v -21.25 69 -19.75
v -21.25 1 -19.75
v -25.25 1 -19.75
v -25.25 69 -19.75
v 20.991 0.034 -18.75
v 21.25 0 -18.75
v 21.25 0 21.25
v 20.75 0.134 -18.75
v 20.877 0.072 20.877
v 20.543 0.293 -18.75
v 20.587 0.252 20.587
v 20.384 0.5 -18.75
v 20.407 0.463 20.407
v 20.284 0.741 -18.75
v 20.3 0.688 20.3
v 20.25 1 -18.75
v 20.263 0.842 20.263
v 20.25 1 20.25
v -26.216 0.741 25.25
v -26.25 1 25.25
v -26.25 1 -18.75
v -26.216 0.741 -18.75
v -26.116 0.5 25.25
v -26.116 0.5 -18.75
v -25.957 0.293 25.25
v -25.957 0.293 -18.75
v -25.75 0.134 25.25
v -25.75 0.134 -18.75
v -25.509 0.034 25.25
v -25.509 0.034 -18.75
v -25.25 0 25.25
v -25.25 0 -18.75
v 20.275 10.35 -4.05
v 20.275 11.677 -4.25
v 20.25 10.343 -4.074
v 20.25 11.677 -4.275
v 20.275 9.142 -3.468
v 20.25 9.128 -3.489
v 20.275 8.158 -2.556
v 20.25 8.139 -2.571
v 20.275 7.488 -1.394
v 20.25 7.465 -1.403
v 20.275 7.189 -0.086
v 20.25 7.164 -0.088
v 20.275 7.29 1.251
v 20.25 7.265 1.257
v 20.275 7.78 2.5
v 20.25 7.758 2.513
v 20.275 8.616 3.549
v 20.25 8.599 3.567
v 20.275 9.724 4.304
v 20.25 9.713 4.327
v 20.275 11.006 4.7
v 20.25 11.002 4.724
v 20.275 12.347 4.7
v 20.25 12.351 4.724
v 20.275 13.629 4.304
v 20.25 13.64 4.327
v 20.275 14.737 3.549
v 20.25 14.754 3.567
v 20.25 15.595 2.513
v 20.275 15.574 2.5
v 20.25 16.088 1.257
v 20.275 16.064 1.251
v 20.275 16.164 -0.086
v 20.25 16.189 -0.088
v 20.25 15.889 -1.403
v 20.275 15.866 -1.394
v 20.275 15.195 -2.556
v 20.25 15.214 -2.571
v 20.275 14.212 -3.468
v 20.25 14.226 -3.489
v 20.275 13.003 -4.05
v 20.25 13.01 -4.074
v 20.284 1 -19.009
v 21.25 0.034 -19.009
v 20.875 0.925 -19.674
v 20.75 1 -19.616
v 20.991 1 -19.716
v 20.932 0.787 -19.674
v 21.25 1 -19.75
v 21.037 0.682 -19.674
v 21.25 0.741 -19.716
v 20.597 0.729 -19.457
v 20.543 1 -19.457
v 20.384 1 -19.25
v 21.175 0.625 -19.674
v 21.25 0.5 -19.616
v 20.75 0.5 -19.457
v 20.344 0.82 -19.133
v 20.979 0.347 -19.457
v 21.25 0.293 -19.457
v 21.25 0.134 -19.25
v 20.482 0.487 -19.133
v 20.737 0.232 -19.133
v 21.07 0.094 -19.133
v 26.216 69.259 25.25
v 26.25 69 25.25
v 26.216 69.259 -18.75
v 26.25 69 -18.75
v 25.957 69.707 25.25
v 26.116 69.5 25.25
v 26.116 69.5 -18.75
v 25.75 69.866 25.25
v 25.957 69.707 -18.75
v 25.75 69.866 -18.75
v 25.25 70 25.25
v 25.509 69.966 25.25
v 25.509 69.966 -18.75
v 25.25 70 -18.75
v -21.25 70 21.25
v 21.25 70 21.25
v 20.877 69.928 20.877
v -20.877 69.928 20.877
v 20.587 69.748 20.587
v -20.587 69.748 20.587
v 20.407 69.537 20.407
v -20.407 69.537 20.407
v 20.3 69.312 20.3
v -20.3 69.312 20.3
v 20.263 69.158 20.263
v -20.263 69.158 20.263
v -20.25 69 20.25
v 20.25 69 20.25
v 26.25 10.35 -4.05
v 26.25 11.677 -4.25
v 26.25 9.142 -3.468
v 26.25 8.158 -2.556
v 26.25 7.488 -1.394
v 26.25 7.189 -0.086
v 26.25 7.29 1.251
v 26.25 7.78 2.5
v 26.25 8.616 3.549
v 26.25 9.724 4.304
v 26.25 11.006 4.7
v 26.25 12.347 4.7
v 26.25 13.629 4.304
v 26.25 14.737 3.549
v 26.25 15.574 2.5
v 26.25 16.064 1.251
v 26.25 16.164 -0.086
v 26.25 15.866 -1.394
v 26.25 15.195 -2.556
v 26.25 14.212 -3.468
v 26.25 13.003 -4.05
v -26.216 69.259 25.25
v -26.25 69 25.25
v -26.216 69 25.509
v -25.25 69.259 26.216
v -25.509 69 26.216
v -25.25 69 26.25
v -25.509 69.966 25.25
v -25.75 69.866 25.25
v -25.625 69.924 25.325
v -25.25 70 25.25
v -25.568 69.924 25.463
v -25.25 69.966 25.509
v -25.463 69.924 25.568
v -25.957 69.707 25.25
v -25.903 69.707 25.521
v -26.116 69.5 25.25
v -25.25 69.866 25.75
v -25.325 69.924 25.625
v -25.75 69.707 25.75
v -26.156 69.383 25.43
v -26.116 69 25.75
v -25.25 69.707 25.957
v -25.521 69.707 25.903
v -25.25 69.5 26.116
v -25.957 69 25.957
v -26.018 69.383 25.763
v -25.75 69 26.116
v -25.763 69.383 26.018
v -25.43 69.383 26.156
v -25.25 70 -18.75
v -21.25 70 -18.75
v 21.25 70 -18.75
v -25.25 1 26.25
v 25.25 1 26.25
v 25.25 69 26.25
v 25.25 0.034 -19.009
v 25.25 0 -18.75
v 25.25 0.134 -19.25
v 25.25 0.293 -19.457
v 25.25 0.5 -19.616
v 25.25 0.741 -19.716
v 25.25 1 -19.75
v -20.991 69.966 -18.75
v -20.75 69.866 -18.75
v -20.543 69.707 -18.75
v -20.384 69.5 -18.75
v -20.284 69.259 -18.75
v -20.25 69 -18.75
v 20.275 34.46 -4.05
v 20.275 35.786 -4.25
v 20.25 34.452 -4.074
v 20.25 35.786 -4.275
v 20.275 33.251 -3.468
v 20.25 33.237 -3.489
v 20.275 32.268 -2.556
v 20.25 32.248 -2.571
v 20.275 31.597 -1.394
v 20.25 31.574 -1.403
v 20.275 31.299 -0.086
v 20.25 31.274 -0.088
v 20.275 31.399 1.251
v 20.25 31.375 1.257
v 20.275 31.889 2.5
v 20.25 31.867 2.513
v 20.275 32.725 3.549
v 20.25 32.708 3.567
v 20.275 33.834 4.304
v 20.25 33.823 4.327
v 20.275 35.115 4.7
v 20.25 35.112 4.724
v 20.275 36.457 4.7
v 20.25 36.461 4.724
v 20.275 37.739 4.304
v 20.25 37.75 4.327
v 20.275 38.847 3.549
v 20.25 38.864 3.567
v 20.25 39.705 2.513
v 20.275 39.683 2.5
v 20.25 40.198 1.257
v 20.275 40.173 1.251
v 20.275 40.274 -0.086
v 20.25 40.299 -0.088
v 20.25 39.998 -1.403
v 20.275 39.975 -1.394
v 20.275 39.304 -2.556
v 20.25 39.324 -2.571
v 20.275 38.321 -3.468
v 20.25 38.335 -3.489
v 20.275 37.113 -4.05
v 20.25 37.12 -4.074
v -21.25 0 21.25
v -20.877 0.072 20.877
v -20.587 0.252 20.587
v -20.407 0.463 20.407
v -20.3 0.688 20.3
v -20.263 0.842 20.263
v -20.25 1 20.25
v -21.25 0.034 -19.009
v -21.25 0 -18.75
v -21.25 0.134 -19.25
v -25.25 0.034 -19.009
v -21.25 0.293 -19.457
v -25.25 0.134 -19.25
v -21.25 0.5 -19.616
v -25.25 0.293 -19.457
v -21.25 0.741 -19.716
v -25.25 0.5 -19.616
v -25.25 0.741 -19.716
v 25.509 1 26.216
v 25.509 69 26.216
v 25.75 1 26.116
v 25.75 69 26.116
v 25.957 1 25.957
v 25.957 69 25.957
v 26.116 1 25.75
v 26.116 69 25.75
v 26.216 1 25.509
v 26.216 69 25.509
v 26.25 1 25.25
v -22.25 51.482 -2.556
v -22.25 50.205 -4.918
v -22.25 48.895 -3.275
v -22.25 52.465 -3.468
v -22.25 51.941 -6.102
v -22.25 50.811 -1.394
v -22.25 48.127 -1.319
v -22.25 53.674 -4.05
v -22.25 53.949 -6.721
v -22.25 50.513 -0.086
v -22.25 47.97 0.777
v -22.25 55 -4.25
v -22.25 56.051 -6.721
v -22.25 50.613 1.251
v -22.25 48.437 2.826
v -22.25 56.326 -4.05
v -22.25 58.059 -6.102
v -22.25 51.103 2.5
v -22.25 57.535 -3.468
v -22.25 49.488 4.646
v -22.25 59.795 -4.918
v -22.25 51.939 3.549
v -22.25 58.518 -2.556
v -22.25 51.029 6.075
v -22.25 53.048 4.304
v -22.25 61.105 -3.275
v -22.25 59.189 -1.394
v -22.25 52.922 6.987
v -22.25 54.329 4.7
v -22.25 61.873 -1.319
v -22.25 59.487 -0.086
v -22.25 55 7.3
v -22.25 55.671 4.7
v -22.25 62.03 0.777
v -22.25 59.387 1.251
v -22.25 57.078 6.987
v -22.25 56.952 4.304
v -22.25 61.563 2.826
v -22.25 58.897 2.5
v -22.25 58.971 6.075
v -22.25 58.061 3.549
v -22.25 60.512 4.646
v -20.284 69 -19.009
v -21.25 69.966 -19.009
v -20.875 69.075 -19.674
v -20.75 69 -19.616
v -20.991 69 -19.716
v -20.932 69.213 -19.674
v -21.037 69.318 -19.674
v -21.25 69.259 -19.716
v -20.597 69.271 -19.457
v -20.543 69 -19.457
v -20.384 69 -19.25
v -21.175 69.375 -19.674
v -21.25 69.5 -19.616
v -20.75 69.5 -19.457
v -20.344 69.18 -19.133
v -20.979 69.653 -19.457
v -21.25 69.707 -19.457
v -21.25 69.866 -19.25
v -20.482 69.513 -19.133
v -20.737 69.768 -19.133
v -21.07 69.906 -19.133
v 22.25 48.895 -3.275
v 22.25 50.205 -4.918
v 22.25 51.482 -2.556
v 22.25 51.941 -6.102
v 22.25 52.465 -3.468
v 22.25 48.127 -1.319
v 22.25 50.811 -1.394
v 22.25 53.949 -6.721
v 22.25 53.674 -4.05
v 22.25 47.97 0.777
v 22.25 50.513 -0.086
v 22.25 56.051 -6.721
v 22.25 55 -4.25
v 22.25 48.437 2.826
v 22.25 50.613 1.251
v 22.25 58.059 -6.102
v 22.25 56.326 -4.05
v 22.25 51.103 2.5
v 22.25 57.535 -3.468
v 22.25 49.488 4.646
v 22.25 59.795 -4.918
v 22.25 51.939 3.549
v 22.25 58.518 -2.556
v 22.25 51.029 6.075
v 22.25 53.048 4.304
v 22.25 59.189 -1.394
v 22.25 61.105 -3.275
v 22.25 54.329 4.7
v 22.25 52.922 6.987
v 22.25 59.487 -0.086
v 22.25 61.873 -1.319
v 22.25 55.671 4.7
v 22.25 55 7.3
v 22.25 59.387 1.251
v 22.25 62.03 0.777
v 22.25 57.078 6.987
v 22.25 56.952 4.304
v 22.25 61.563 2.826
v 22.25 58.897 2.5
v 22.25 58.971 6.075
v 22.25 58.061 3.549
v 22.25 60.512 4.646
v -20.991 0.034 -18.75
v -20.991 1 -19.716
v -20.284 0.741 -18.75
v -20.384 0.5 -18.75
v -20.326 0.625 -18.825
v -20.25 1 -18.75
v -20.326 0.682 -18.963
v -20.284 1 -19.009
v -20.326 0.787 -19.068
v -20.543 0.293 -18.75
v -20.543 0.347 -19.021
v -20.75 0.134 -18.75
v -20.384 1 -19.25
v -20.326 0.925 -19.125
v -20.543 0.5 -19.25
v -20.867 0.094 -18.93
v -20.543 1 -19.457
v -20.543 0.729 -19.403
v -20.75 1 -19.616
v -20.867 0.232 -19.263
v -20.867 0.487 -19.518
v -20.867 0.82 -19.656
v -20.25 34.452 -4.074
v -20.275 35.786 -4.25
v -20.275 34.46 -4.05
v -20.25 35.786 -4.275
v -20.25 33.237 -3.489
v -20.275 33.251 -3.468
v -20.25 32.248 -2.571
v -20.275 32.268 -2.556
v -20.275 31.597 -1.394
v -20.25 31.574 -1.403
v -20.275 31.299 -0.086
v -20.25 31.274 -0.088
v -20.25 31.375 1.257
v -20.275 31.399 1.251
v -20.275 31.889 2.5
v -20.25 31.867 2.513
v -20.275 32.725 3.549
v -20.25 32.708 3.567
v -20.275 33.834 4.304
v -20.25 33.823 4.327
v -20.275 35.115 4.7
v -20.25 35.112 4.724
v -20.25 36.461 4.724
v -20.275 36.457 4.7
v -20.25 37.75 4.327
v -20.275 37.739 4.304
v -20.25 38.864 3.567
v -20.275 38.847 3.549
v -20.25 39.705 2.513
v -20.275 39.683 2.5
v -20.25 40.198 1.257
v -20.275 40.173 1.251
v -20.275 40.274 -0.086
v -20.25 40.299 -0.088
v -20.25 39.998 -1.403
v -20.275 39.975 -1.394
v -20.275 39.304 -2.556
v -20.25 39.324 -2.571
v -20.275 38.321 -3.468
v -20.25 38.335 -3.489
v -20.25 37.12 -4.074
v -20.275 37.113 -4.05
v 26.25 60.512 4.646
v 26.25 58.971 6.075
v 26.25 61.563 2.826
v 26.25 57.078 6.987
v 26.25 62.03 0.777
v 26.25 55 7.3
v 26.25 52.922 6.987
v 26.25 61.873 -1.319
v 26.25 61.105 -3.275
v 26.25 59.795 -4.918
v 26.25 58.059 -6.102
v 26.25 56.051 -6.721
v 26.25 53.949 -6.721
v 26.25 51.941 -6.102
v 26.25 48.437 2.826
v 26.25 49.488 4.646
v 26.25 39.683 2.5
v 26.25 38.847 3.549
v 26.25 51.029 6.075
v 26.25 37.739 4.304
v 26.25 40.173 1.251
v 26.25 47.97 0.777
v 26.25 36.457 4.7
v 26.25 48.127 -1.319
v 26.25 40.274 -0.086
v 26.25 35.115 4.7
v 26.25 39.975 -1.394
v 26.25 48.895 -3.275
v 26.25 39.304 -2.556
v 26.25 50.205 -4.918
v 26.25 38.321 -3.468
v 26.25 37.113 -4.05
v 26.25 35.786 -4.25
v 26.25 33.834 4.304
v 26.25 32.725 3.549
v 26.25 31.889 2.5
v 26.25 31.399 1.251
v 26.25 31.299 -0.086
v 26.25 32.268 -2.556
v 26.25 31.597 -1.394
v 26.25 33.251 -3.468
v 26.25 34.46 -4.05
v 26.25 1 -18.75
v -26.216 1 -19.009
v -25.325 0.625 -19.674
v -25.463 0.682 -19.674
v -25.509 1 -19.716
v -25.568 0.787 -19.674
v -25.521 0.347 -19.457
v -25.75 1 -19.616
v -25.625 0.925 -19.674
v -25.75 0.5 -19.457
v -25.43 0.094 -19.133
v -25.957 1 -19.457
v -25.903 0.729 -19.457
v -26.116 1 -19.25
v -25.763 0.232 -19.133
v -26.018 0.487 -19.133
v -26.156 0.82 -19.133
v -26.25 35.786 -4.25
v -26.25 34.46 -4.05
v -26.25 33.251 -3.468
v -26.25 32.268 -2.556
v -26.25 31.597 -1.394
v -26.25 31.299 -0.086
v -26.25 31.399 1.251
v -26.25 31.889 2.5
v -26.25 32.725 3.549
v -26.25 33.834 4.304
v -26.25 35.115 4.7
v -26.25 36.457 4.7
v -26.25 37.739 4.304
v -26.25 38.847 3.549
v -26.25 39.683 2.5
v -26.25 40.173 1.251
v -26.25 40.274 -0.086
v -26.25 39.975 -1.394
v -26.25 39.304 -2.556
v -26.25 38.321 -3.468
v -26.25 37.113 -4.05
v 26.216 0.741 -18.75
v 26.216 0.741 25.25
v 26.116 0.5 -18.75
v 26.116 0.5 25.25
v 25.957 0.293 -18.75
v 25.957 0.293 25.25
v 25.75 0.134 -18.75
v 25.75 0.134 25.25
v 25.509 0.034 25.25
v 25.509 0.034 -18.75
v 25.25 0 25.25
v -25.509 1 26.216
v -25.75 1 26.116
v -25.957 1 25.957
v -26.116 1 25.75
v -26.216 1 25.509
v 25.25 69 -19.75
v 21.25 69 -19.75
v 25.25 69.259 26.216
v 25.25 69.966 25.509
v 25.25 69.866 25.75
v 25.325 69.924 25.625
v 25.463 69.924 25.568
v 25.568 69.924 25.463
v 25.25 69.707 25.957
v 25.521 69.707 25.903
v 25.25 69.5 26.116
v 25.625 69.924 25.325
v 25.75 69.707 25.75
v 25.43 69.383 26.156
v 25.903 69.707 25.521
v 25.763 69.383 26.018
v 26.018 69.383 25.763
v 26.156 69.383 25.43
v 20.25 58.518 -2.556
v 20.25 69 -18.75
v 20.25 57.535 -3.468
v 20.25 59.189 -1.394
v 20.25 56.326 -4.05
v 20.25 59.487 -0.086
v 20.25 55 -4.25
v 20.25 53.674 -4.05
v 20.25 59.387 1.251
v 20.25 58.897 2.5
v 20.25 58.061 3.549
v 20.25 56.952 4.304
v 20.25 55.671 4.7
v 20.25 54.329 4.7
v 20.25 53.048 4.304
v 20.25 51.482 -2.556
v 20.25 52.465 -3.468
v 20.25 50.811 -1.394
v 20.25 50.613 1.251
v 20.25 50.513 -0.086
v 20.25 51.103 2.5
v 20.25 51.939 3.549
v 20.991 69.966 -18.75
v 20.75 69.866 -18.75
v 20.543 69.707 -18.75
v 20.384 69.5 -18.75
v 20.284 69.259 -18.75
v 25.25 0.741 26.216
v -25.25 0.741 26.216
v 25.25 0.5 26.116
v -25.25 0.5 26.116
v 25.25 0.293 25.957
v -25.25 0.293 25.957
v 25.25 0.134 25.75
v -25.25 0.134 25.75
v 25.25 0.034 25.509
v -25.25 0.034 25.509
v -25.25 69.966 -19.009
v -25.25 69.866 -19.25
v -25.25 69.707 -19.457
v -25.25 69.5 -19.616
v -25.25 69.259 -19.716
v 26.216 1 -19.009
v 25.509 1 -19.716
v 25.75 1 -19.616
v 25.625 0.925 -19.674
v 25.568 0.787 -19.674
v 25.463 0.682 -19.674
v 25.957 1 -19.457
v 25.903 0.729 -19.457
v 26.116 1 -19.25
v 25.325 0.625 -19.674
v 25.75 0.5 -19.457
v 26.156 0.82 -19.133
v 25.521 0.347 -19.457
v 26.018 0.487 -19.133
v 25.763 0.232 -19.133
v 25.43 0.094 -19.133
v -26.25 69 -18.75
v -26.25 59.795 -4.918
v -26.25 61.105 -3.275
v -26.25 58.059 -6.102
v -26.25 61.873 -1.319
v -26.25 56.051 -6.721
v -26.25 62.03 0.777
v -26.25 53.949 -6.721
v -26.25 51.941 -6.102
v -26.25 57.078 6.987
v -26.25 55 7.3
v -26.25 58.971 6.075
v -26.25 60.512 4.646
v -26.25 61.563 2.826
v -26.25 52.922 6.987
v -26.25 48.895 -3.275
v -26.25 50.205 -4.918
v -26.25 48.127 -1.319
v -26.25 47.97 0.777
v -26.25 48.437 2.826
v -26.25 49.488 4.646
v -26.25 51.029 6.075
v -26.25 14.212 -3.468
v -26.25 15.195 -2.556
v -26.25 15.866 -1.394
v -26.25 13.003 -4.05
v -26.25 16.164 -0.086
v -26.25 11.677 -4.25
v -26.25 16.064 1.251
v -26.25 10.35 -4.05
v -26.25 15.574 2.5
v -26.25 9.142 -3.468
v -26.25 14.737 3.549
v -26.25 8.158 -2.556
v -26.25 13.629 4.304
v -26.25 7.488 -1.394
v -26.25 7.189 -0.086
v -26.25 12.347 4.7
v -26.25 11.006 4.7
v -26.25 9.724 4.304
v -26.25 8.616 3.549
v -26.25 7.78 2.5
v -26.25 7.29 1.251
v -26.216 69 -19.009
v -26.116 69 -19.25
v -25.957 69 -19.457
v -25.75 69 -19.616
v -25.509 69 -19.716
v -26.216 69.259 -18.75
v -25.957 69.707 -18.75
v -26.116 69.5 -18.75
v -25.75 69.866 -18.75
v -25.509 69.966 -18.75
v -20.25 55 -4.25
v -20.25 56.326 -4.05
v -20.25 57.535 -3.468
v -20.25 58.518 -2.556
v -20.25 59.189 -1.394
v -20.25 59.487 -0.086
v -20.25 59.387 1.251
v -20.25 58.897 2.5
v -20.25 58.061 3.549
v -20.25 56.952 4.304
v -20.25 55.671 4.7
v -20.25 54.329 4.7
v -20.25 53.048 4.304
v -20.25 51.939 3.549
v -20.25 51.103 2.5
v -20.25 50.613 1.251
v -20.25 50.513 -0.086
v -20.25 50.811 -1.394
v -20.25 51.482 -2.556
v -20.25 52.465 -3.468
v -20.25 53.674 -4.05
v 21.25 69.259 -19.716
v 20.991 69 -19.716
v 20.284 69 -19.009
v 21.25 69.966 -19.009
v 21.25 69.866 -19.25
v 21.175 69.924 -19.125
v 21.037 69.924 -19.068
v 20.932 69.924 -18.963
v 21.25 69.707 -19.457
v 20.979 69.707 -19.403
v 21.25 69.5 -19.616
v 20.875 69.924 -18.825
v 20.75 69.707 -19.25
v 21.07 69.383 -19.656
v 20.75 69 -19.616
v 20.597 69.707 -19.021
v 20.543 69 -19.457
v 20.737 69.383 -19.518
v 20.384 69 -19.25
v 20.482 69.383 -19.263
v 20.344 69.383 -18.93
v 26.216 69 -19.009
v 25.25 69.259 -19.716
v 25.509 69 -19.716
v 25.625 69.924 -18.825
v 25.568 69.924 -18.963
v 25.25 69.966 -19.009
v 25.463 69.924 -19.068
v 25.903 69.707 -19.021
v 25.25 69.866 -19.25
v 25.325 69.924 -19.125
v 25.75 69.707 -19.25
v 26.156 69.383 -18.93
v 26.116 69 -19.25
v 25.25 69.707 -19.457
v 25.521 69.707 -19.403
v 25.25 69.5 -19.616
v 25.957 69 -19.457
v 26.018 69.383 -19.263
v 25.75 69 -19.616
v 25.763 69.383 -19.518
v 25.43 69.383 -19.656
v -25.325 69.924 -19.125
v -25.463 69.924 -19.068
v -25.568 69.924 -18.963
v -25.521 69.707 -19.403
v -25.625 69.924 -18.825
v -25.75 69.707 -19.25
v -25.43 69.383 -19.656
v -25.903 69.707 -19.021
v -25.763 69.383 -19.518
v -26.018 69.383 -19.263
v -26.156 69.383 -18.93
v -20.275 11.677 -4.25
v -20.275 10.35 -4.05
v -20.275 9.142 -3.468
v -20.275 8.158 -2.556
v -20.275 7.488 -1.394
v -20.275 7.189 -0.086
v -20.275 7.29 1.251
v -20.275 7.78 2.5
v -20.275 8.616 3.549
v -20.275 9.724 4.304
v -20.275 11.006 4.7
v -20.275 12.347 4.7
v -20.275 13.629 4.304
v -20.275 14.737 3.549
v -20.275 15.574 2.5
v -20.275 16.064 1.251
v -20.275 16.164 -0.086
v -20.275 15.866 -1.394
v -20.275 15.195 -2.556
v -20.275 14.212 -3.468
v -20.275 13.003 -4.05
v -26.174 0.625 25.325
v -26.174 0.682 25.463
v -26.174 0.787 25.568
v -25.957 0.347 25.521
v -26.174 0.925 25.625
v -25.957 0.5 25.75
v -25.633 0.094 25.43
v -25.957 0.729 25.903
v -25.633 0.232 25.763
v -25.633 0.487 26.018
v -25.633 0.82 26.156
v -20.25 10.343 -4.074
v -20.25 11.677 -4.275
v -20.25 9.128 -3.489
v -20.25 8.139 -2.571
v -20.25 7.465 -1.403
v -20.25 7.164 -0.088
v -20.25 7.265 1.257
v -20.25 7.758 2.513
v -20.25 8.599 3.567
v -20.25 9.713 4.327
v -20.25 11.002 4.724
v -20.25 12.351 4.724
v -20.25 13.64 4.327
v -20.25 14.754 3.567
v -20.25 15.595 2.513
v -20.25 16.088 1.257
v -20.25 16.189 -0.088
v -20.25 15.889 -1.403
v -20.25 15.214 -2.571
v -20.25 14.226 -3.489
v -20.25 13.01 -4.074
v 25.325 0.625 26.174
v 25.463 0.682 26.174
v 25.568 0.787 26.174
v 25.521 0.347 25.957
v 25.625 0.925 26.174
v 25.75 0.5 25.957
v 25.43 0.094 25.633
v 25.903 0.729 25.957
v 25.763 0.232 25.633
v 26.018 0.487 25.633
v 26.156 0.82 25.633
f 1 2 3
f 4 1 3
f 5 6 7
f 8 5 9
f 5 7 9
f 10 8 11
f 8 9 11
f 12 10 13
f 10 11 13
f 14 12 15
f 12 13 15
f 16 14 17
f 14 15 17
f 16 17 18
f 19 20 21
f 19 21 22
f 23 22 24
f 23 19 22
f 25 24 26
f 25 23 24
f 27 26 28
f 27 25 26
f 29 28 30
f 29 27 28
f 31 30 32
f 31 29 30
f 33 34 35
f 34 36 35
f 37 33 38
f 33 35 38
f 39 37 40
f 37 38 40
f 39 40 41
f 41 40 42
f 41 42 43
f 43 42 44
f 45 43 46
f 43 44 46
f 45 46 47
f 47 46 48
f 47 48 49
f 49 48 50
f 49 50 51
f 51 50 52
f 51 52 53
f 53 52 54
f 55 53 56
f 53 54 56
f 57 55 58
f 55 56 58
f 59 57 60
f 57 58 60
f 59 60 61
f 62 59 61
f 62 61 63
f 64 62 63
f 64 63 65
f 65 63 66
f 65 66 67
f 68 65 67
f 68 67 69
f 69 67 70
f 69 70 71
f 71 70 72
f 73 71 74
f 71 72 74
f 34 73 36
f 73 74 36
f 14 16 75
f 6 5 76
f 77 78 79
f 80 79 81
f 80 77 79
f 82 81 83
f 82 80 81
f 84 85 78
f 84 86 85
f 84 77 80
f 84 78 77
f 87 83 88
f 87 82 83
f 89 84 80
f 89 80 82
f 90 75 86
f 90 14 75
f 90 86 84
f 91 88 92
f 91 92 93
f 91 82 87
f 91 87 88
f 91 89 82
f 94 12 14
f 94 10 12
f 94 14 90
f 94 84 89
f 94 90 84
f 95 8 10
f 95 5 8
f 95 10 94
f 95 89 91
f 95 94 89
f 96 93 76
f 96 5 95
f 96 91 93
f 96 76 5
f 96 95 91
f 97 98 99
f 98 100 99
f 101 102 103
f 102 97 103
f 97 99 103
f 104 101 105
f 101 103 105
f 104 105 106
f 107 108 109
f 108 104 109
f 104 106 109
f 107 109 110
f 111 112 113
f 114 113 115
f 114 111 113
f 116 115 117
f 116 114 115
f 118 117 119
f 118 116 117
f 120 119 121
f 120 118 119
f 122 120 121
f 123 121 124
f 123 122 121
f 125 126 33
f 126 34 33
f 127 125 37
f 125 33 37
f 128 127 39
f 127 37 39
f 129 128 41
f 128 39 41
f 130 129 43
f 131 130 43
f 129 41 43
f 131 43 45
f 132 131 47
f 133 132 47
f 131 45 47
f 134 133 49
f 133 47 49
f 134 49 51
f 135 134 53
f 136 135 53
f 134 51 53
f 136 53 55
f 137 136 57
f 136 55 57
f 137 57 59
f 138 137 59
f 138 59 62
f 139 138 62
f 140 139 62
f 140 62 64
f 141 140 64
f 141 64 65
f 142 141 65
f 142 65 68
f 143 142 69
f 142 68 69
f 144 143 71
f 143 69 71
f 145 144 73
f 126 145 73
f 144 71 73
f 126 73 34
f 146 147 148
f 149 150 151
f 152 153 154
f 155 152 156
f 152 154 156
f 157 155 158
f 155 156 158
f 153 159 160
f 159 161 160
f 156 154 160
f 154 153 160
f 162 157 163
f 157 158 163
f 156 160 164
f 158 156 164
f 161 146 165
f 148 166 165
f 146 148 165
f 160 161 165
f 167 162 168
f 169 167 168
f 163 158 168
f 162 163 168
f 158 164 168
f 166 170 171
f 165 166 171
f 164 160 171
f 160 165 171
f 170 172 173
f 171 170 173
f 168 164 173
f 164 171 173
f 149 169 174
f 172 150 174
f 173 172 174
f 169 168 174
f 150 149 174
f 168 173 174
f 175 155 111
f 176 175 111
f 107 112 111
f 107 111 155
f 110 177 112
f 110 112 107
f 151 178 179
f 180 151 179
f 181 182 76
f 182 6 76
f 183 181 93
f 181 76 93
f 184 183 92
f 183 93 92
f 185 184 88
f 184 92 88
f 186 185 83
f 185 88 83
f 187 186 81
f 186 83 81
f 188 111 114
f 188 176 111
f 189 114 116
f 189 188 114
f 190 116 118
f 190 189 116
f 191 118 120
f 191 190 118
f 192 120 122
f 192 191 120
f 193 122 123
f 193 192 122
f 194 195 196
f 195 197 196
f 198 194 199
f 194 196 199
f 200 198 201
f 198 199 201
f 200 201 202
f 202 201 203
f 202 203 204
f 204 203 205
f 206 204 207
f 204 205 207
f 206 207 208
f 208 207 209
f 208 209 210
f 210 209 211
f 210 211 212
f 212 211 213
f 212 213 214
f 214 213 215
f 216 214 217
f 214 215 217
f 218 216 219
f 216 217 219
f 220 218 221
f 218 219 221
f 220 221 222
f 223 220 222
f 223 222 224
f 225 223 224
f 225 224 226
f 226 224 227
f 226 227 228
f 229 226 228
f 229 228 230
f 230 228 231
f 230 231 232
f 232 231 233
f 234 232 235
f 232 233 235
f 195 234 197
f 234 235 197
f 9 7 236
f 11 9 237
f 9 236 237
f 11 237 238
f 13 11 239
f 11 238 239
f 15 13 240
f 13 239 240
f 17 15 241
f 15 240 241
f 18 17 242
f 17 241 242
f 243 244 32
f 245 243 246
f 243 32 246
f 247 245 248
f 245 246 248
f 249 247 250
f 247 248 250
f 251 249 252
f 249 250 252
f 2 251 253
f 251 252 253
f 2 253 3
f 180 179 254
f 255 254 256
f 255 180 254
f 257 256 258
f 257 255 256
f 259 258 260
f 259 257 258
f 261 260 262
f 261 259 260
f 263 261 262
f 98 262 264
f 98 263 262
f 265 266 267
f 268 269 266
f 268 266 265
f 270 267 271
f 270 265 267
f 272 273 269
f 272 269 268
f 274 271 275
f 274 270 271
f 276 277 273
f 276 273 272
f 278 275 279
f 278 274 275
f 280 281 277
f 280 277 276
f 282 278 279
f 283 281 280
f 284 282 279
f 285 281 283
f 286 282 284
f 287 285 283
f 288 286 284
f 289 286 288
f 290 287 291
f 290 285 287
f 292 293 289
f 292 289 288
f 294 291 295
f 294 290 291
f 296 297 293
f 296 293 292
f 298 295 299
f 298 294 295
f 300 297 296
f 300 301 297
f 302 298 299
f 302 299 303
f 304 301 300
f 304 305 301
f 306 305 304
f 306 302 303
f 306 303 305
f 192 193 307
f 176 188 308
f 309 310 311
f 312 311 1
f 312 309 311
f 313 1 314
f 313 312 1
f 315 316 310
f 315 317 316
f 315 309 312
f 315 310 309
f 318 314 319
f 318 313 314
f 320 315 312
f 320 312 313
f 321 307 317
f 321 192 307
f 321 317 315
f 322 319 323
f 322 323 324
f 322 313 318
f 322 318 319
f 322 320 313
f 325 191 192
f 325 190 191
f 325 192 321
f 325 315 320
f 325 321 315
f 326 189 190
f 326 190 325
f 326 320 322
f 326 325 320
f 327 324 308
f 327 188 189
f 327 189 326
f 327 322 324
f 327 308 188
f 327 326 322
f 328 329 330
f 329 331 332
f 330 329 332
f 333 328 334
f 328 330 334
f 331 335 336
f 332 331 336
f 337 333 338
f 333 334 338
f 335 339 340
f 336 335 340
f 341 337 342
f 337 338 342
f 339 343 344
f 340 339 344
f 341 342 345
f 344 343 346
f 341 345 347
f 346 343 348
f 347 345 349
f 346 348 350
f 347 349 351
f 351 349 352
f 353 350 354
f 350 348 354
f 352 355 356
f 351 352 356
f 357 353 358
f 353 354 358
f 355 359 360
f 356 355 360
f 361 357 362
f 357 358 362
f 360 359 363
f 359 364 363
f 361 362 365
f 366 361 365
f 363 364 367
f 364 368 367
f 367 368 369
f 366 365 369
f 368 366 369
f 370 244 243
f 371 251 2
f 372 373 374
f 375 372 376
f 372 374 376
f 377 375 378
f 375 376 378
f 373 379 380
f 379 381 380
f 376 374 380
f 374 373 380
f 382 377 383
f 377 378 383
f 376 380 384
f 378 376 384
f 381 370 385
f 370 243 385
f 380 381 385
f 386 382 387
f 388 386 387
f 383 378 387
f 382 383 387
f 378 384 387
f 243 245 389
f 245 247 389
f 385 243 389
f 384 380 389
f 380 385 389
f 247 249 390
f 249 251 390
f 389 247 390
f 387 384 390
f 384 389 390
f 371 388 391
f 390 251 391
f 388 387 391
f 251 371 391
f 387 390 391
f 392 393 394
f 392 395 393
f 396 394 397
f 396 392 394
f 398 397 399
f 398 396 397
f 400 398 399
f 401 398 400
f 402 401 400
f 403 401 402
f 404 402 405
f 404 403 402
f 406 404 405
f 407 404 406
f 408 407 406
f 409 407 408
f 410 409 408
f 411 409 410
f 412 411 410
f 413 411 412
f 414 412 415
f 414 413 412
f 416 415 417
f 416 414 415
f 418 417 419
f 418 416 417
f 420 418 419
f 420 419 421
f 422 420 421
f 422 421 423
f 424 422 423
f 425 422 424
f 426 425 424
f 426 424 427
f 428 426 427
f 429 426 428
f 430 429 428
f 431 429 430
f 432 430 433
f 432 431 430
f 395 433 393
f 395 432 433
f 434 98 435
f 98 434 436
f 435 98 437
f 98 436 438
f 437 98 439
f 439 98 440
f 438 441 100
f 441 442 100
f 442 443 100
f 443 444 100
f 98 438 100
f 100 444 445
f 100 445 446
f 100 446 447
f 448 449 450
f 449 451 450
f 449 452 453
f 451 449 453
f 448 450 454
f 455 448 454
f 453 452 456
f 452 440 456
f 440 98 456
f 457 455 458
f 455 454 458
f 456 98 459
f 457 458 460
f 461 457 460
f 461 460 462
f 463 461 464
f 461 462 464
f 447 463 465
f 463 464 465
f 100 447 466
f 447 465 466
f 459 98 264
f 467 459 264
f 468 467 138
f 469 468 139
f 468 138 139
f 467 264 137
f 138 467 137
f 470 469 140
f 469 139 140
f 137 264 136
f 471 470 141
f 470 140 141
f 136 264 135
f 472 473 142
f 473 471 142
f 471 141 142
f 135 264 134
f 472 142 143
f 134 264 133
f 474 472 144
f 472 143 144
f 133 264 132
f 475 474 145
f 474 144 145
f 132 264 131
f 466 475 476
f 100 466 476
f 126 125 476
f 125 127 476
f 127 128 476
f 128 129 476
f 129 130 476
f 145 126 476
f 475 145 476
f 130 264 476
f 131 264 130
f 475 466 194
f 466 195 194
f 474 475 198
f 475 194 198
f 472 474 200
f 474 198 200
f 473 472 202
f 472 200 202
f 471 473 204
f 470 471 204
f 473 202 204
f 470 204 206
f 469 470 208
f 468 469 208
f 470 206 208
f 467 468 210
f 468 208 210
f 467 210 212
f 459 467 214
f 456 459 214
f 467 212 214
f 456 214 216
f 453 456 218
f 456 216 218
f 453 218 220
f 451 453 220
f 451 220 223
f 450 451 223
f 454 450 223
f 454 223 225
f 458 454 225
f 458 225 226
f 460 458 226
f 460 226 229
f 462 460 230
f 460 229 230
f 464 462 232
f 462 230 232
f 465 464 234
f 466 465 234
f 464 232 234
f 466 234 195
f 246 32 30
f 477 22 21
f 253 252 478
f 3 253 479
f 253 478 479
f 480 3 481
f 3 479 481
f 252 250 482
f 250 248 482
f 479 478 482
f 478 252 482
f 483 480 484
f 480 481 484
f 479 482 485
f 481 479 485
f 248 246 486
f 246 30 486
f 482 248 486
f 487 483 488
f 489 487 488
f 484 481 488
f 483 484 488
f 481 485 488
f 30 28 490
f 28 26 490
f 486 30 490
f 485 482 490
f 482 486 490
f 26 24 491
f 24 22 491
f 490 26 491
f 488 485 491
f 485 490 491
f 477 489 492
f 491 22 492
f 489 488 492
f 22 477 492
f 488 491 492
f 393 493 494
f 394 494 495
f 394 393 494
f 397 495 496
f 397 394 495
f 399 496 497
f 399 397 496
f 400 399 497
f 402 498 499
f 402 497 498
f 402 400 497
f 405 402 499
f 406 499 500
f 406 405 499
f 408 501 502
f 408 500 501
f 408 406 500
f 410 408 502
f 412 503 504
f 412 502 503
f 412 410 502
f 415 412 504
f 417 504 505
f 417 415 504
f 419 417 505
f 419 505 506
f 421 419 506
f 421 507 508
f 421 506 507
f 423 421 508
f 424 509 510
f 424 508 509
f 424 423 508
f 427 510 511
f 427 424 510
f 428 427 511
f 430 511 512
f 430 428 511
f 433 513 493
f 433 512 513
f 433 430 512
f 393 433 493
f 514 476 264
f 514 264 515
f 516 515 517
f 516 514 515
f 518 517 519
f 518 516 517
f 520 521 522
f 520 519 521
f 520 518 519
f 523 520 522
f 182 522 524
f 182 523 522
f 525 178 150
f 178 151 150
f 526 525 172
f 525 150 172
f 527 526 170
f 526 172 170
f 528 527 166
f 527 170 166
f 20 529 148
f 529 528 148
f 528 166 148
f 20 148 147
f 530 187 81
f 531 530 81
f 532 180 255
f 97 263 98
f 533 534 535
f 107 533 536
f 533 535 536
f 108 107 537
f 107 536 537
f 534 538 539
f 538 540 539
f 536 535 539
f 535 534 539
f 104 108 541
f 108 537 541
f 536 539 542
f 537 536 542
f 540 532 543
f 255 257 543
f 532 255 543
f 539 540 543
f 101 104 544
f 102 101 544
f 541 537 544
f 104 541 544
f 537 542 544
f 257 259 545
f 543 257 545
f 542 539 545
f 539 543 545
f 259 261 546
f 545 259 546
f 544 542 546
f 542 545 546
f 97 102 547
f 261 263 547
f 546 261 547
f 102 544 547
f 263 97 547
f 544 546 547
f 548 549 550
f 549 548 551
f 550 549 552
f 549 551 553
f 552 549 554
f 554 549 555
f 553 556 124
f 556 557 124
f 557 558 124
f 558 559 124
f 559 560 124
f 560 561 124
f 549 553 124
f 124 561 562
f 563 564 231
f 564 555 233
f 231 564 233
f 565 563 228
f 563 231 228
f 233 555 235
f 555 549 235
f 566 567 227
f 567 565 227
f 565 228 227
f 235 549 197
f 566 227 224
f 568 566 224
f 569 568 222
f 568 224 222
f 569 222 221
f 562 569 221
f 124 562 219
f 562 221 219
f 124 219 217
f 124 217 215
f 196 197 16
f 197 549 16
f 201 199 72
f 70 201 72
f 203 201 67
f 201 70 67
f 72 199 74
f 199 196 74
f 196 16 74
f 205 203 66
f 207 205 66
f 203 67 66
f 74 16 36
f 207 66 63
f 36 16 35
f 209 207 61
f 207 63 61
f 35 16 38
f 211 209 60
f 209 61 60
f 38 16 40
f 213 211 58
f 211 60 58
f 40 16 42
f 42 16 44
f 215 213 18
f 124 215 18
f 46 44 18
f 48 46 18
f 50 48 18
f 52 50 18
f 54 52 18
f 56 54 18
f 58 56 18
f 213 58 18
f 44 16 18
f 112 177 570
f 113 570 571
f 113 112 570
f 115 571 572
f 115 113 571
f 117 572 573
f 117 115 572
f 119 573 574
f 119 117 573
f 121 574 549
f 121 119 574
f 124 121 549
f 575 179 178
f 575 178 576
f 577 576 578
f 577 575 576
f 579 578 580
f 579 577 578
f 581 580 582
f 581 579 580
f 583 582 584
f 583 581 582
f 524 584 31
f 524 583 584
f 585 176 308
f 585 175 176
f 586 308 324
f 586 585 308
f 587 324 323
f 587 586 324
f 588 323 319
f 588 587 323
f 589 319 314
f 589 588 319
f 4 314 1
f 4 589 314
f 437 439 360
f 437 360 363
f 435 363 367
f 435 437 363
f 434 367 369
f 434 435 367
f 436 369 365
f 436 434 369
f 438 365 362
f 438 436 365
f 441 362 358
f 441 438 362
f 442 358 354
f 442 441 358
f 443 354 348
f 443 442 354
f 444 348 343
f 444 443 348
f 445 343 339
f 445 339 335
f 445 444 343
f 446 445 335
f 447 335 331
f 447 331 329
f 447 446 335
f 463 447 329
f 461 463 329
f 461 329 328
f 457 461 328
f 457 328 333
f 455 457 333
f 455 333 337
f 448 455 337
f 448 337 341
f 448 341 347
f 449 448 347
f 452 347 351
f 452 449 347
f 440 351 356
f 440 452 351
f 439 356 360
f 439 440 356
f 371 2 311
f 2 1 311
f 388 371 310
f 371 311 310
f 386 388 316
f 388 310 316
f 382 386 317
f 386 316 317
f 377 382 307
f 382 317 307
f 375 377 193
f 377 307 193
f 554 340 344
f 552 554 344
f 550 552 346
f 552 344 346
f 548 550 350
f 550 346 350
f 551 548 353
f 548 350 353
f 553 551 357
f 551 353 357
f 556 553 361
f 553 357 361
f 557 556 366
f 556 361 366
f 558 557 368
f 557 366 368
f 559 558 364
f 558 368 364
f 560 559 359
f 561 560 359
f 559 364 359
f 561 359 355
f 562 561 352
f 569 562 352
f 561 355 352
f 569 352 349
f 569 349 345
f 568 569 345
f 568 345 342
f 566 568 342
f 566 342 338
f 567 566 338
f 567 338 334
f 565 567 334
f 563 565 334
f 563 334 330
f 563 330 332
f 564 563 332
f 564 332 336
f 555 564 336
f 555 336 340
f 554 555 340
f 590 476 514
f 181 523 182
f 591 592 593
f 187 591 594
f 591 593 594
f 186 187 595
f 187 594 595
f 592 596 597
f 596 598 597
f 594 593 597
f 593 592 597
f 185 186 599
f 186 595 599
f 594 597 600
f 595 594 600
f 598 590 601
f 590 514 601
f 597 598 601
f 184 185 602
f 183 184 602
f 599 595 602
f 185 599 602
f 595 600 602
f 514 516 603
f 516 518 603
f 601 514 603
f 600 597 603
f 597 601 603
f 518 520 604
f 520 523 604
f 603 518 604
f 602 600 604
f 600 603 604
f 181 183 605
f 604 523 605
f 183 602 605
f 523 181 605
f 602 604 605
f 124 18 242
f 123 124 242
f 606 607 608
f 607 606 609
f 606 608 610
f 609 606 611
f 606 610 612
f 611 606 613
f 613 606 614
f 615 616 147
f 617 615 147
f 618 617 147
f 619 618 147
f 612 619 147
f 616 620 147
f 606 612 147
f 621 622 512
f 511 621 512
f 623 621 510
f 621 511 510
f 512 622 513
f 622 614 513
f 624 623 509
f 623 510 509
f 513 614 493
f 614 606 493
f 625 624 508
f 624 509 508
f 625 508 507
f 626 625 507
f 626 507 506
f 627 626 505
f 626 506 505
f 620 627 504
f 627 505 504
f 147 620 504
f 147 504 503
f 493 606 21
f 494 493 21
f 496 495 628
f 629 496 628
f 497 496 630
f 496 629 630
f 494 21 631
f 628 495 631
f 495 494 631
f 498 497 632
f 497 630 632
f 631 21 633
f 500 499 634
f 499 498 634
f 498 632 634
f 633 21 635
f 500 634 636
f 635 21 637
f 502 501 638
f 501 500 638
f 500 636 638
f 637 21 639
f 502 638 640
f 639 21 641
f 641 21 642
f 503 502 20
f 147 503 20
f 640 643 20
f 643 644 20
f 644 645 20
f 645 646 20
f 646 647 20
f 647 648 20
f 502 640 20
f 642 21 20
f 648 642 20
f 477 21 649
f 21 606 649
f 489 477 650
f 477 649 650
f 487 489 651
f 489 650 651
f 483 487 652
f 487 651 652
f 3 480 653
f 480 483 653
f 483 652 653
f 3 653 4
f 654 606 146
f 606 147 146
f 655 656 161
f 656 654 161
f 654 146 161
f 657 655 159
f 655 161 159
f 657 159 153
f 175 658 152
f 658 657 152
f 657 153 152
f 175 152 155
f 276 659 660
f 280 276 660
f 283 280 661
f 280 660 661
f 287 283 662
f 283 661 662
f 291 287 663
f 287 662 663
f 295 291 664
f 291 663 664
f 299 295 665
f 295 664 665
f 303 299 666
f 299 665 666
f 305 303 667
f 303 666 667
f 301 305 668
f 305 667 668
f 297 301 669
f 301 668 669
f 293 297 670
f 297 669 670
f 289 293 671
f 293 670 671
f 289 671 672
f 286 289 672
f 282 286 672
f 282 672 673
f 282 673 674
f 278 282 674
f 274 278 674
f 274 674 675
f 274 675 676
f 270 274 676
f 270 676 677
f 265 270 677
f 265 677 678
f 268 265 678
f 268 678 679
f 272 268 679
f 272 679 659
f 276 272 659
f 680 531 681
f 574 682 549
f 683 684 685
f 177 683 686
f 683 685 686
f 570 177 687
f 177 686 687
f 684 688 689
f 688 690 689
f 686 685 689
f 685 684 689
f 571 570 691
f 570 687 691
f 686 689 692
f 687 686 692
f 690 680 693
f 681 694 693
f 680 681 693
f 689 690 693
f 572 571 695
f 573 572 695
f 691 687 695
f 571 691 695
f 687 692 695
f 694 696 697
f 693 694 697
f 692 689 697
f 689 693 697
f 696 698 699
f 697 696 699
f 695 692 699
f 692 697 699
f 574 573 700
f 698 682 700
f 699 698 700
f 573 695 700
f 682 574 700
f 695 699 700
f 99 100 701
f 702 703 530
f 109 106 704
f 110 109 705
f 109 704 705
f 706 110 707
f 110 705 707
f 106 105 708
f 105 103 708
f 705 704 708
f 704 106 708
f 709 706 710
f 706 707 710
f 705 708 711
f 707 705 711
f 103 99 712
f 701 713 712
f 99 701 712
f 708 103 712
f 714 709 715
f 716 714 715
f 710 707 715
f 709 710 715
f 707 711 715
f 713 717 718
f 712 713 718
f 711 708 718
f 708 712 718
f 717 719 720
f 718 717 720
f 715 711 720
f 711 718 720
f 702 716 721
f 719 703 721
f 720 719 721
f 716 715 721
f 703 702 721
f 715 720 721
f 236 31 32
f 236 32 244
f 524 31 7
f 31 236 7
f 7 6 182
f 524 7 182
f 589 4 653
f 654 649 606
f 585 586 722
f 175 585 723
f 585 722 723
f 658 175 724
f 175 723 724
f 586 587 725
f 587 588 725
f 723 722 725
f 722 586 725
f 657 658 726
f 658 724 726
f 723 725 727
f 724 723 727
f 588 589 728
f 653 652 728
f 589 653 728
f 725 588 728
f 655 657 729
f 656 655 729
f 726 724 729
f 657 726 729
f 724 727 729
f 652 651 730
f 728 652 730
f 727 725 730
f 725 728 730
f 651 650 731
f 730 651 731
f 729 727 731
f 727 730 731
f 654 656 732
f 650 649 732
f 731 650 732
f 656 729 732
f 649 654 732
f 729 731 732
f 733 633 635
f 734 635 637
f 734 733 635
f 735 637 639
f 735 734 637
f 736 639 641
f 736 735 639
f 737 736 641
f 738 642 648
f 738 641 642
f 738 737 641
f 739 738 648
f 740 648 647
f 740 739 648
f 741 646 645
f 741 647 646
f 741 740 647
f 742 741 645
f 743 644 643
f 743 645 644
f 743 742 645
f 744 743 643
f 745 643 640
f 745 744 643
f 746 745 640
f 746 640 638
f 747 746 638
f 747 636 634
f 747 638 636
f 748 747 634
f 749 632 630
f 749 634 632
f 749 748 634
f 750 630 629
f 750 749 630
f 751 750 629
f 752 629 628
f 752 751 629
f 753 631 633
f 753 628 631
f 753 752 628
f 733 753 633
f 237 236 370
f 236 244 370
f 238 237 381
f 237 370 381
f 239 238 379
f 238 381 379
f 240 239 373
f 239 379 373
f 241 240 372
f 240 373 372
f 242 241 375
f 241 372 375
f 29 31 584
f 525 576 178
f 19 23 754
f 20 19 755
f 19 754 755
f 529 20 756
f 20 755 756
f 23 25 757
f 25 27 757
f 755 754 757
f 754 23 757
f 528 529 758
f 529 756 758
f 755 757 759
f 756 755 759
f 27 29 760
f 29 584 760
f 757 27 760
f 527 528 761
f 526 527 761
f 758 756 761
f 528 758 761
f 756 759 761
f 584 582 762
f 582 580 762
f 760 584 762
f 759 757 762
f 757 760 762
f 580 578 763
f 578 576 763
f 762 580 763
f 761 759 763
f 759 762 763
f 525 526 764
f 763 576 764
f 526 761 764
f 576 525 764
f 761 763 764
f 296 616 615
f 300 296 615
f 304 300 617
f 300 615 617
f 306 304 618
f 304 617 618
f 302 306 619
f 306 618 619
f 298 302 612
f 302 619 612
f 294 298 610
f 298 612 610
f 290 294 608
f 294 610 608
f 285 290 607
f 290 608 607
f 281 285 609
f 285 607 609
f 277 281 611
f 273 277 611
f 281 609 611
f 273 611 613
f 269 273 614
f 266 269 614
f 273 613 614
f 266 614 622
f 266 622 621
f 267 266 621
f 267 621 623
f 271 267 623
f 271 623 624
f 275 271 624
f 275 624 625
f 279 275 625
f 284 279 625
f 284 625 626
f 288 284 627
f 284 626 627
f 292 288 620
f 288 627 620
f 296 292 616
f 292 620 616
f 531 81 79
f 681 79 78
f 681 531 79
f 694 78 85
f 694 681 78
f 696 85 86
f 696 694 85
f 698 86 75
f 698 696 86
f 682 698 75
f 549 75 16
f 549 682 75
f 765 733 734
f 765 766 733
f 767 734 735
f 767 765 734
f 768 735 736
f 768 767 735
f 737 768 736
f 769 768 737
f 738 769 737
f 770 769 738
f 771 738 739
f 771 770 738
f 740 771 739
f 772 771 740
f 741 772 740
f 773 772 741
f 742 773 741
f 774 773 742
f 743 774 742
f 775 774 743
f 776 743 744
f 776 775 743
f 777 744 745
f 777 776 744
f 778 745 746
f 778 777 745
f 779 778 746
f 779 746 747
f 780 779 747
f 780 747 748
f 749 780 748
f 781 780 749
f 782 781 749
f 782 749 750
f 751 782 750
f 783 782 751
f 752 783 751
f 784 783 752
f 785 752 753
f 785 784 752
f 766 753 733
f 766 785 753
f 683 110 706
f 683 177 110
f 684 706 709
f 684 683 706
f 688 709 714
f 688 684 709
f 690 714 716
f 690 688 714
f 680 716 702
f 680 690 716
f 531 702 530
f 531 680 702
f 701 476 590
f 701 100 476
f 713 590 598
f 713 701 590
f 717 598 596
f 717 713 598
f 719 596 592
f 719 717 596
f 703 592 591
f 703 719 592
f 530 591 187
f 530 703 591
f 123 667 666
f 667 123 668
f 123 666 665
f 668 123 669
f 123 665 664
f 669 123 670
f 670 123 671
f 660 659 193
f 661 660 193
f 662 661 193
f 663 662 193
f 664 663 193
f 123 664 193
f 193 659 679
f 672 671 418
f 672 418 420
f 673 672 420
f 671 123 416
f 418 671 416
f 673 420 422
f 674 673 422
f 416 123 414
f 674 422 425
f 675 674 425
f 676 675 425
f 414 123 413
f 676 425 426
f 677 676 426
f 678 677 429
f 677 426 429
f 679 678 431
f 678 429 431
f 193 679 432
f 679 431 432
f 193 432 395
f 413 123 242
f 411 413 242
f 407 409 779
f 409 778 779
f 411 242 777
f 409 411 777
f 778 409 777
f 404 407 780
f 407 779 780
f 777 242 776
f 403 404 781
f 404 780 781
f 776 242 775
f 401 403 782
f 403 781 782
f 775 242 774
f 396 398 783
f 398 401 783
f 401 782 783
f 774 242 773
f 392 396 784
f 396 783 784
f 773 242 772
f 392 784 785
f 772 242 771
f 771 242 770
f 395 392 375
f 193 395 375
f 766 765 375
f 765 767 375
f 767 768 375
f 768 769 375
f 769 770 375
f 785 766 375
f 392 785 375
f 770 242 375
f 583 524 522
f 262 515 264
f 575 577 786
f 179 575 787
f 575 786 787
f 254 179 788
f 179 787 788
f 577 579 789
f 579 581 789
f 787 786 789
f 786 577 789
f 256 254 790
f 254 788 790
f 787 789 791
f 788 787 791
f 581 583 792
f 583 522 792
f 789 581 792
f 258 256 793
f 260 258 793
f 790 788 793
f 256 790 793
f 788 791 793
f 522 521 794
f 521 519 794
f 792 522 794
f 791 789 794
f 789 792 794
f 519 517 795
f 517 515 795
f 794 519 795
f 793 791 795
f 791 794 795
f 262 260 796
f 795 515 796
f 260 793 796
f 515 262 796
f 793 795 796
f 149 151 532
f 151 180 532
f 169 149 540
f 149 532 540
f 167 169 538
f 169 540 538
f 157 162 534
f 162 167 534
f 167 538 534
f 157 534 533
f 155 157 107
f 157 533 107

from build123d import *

# Parameters (mm, degrees)
BOSS_EXTRUDE1_DEPTH           = 70
SKETCH8_R                     = 4.5
CUT_EXTRUDE4_DEPTH            = 53.5
SKETCH10_R                    = 7.05
CUT_EXTRUDE5_DEPTH            = 4
FILLET13_R                    = 1
M8_CLEARANCE_HOLE1_AT_2_COUNT = 2
M8_CLEARANCE_HOLE1_AT_2_PITCH = 24.109474775


with BuildPart() as part:
    # Sketch1 → Boss-Extrude1 (new body)
    with BuildSketch(Plane(origin=(0, 0, 0), x_dir=(1, 0, 0), z_dir=(0, 1, 0))):
        Polygon((-26.25, -26.25), (26.25, -26.25), (26.25, 19.75), (20.25, 19.75), (20.25, -20.25), (-20.25, -20.25), (-20.25, 19.75), (-26.25, 19.75), align=None)
    extrude(amount=BOSS_EXTRUDE1_DEPTH)

    # Sketch8 → Cut-Extrude4 (cut, through all)
    with BuildSketch(Plane(origin=(26.25, 0, 0), x_dir=(0, 0, -1), z_dir=(1, 0, 0))):
        with Locations((-0.25, 55)):
            Circle(SKETCH8_R)
    extrude(amount=-CUT_EXTRUDE4_DEPTH, mode=Mode.SUBTRACT)

    # Sketch10 → Cut-Extrude5 (cut)
    with BuildSketch(Plane.ZY.offset(26.25)):
        with Locations((0.25, 55)):
            Circle(SKETCH10_R)
    cut_extrude5 = extrude(amount=-CUT_EXTRUDE5_DEPTH, mode=Mode.SUBTRACT)

    # Mirror1: Cut-Extrude5 across plane
    add(cut_extrude5.mirror(Plane(origin=(0, 0, 0), x_dir=(0, 0, 1), z_dir=(1, 0, 0))), mode=Mode.SUBTRACT)

    # Fillet13
    fillet13_edges = [part.edges().sort_by_distance(p)[0] for p in [
        (26.25, 0, 3.25),
        (0, 0, 26.25),
        (0, 70, 20.25),
        (-26.25, 0, 3.25),
        (-23.25, 0, -19.75),
        (-20.25, 0, 0.25),
        (0, 0, 20.25),
        (20.25, 0, 0.25),
        (-20.25, 70, 0.25),
        (20.25, 35, -19.75),
        (26.25, 35, -19.75),
        (26.25, 35, 26.25),
        (-26.25, 35, 26.25),
        (-26.25, 35, -19.75),
        (-20.25, 35, -19.75),
        (-23.25, 70, -19.75),
        (-26.25, 70, 3.25),
        (0, 70, 26.25),
        (26.25, 70, 3.25),
        (23.25, 70, -19.75),
        (20.25, 70, 0.25),
        (23.25, 0, -19.75),
    ]]
    fillet(fillet13_edges, radius=FILLET13_R)

    # Sketch18 → M8 Clearance Hole1 (revolve, cut)
    with BuildSketch(Plane(origin=(-20.25, 35.786178525, 0.25), x_dir=(0, 0, -1), z_dir=(0, 1, 0))):
        Polygon((0, 0), (0, 15.703872786), (4.5, 13), (4.5, 0.025), (4.525, 0), align=None)
    m8_clearance_hole1 = revolve(axis=Axis((-13.9, 35.786178525, 0.25), (-1, 0, 0)), mode=Mode.SUBTRACT)

    # M8 Clearance Hole1 at 2: M8 Clearance Hole1 ×2
    with Locations(*[(0, -i * M8_CLEARANCE_HOLE1_AT_2_PITCH, 0) for i in range(1, M8_CLEARANCE_HOLE1_AT_2_COUNT)]):
        add(m8_clearance_hole1, mode=Mode.SUBTRACT)

    # Mirror2: M8 Clearance Hole1 across plane
    add(m8_clearance_hole1.mirror(Plane(origin=(0, 0, 0), x_dir=(0, 0, 1), z_dir=(1, 0, 0))), mode=Mode.SUBTRACT)

    # Mirror2 copy 1 sketch → Mirror2 copy 1 (revolve, cut)
    with BuildSketch(Plane(origin=(20.25, 11.676703751, 0.25), x_dir=(0, 0, -1), z_dir=(0, 1, 0))):
        Polygon((0, 0), (0, -15.703872786), (4.5, -13), (4.5, -0.025), (4.525, 0), align=None)
    revolve(axis=Axis((13.9, 11.676703751, 0.25), (-1, 0, 0)), mode=Mode.SUBTRACT)


solid = part.part
